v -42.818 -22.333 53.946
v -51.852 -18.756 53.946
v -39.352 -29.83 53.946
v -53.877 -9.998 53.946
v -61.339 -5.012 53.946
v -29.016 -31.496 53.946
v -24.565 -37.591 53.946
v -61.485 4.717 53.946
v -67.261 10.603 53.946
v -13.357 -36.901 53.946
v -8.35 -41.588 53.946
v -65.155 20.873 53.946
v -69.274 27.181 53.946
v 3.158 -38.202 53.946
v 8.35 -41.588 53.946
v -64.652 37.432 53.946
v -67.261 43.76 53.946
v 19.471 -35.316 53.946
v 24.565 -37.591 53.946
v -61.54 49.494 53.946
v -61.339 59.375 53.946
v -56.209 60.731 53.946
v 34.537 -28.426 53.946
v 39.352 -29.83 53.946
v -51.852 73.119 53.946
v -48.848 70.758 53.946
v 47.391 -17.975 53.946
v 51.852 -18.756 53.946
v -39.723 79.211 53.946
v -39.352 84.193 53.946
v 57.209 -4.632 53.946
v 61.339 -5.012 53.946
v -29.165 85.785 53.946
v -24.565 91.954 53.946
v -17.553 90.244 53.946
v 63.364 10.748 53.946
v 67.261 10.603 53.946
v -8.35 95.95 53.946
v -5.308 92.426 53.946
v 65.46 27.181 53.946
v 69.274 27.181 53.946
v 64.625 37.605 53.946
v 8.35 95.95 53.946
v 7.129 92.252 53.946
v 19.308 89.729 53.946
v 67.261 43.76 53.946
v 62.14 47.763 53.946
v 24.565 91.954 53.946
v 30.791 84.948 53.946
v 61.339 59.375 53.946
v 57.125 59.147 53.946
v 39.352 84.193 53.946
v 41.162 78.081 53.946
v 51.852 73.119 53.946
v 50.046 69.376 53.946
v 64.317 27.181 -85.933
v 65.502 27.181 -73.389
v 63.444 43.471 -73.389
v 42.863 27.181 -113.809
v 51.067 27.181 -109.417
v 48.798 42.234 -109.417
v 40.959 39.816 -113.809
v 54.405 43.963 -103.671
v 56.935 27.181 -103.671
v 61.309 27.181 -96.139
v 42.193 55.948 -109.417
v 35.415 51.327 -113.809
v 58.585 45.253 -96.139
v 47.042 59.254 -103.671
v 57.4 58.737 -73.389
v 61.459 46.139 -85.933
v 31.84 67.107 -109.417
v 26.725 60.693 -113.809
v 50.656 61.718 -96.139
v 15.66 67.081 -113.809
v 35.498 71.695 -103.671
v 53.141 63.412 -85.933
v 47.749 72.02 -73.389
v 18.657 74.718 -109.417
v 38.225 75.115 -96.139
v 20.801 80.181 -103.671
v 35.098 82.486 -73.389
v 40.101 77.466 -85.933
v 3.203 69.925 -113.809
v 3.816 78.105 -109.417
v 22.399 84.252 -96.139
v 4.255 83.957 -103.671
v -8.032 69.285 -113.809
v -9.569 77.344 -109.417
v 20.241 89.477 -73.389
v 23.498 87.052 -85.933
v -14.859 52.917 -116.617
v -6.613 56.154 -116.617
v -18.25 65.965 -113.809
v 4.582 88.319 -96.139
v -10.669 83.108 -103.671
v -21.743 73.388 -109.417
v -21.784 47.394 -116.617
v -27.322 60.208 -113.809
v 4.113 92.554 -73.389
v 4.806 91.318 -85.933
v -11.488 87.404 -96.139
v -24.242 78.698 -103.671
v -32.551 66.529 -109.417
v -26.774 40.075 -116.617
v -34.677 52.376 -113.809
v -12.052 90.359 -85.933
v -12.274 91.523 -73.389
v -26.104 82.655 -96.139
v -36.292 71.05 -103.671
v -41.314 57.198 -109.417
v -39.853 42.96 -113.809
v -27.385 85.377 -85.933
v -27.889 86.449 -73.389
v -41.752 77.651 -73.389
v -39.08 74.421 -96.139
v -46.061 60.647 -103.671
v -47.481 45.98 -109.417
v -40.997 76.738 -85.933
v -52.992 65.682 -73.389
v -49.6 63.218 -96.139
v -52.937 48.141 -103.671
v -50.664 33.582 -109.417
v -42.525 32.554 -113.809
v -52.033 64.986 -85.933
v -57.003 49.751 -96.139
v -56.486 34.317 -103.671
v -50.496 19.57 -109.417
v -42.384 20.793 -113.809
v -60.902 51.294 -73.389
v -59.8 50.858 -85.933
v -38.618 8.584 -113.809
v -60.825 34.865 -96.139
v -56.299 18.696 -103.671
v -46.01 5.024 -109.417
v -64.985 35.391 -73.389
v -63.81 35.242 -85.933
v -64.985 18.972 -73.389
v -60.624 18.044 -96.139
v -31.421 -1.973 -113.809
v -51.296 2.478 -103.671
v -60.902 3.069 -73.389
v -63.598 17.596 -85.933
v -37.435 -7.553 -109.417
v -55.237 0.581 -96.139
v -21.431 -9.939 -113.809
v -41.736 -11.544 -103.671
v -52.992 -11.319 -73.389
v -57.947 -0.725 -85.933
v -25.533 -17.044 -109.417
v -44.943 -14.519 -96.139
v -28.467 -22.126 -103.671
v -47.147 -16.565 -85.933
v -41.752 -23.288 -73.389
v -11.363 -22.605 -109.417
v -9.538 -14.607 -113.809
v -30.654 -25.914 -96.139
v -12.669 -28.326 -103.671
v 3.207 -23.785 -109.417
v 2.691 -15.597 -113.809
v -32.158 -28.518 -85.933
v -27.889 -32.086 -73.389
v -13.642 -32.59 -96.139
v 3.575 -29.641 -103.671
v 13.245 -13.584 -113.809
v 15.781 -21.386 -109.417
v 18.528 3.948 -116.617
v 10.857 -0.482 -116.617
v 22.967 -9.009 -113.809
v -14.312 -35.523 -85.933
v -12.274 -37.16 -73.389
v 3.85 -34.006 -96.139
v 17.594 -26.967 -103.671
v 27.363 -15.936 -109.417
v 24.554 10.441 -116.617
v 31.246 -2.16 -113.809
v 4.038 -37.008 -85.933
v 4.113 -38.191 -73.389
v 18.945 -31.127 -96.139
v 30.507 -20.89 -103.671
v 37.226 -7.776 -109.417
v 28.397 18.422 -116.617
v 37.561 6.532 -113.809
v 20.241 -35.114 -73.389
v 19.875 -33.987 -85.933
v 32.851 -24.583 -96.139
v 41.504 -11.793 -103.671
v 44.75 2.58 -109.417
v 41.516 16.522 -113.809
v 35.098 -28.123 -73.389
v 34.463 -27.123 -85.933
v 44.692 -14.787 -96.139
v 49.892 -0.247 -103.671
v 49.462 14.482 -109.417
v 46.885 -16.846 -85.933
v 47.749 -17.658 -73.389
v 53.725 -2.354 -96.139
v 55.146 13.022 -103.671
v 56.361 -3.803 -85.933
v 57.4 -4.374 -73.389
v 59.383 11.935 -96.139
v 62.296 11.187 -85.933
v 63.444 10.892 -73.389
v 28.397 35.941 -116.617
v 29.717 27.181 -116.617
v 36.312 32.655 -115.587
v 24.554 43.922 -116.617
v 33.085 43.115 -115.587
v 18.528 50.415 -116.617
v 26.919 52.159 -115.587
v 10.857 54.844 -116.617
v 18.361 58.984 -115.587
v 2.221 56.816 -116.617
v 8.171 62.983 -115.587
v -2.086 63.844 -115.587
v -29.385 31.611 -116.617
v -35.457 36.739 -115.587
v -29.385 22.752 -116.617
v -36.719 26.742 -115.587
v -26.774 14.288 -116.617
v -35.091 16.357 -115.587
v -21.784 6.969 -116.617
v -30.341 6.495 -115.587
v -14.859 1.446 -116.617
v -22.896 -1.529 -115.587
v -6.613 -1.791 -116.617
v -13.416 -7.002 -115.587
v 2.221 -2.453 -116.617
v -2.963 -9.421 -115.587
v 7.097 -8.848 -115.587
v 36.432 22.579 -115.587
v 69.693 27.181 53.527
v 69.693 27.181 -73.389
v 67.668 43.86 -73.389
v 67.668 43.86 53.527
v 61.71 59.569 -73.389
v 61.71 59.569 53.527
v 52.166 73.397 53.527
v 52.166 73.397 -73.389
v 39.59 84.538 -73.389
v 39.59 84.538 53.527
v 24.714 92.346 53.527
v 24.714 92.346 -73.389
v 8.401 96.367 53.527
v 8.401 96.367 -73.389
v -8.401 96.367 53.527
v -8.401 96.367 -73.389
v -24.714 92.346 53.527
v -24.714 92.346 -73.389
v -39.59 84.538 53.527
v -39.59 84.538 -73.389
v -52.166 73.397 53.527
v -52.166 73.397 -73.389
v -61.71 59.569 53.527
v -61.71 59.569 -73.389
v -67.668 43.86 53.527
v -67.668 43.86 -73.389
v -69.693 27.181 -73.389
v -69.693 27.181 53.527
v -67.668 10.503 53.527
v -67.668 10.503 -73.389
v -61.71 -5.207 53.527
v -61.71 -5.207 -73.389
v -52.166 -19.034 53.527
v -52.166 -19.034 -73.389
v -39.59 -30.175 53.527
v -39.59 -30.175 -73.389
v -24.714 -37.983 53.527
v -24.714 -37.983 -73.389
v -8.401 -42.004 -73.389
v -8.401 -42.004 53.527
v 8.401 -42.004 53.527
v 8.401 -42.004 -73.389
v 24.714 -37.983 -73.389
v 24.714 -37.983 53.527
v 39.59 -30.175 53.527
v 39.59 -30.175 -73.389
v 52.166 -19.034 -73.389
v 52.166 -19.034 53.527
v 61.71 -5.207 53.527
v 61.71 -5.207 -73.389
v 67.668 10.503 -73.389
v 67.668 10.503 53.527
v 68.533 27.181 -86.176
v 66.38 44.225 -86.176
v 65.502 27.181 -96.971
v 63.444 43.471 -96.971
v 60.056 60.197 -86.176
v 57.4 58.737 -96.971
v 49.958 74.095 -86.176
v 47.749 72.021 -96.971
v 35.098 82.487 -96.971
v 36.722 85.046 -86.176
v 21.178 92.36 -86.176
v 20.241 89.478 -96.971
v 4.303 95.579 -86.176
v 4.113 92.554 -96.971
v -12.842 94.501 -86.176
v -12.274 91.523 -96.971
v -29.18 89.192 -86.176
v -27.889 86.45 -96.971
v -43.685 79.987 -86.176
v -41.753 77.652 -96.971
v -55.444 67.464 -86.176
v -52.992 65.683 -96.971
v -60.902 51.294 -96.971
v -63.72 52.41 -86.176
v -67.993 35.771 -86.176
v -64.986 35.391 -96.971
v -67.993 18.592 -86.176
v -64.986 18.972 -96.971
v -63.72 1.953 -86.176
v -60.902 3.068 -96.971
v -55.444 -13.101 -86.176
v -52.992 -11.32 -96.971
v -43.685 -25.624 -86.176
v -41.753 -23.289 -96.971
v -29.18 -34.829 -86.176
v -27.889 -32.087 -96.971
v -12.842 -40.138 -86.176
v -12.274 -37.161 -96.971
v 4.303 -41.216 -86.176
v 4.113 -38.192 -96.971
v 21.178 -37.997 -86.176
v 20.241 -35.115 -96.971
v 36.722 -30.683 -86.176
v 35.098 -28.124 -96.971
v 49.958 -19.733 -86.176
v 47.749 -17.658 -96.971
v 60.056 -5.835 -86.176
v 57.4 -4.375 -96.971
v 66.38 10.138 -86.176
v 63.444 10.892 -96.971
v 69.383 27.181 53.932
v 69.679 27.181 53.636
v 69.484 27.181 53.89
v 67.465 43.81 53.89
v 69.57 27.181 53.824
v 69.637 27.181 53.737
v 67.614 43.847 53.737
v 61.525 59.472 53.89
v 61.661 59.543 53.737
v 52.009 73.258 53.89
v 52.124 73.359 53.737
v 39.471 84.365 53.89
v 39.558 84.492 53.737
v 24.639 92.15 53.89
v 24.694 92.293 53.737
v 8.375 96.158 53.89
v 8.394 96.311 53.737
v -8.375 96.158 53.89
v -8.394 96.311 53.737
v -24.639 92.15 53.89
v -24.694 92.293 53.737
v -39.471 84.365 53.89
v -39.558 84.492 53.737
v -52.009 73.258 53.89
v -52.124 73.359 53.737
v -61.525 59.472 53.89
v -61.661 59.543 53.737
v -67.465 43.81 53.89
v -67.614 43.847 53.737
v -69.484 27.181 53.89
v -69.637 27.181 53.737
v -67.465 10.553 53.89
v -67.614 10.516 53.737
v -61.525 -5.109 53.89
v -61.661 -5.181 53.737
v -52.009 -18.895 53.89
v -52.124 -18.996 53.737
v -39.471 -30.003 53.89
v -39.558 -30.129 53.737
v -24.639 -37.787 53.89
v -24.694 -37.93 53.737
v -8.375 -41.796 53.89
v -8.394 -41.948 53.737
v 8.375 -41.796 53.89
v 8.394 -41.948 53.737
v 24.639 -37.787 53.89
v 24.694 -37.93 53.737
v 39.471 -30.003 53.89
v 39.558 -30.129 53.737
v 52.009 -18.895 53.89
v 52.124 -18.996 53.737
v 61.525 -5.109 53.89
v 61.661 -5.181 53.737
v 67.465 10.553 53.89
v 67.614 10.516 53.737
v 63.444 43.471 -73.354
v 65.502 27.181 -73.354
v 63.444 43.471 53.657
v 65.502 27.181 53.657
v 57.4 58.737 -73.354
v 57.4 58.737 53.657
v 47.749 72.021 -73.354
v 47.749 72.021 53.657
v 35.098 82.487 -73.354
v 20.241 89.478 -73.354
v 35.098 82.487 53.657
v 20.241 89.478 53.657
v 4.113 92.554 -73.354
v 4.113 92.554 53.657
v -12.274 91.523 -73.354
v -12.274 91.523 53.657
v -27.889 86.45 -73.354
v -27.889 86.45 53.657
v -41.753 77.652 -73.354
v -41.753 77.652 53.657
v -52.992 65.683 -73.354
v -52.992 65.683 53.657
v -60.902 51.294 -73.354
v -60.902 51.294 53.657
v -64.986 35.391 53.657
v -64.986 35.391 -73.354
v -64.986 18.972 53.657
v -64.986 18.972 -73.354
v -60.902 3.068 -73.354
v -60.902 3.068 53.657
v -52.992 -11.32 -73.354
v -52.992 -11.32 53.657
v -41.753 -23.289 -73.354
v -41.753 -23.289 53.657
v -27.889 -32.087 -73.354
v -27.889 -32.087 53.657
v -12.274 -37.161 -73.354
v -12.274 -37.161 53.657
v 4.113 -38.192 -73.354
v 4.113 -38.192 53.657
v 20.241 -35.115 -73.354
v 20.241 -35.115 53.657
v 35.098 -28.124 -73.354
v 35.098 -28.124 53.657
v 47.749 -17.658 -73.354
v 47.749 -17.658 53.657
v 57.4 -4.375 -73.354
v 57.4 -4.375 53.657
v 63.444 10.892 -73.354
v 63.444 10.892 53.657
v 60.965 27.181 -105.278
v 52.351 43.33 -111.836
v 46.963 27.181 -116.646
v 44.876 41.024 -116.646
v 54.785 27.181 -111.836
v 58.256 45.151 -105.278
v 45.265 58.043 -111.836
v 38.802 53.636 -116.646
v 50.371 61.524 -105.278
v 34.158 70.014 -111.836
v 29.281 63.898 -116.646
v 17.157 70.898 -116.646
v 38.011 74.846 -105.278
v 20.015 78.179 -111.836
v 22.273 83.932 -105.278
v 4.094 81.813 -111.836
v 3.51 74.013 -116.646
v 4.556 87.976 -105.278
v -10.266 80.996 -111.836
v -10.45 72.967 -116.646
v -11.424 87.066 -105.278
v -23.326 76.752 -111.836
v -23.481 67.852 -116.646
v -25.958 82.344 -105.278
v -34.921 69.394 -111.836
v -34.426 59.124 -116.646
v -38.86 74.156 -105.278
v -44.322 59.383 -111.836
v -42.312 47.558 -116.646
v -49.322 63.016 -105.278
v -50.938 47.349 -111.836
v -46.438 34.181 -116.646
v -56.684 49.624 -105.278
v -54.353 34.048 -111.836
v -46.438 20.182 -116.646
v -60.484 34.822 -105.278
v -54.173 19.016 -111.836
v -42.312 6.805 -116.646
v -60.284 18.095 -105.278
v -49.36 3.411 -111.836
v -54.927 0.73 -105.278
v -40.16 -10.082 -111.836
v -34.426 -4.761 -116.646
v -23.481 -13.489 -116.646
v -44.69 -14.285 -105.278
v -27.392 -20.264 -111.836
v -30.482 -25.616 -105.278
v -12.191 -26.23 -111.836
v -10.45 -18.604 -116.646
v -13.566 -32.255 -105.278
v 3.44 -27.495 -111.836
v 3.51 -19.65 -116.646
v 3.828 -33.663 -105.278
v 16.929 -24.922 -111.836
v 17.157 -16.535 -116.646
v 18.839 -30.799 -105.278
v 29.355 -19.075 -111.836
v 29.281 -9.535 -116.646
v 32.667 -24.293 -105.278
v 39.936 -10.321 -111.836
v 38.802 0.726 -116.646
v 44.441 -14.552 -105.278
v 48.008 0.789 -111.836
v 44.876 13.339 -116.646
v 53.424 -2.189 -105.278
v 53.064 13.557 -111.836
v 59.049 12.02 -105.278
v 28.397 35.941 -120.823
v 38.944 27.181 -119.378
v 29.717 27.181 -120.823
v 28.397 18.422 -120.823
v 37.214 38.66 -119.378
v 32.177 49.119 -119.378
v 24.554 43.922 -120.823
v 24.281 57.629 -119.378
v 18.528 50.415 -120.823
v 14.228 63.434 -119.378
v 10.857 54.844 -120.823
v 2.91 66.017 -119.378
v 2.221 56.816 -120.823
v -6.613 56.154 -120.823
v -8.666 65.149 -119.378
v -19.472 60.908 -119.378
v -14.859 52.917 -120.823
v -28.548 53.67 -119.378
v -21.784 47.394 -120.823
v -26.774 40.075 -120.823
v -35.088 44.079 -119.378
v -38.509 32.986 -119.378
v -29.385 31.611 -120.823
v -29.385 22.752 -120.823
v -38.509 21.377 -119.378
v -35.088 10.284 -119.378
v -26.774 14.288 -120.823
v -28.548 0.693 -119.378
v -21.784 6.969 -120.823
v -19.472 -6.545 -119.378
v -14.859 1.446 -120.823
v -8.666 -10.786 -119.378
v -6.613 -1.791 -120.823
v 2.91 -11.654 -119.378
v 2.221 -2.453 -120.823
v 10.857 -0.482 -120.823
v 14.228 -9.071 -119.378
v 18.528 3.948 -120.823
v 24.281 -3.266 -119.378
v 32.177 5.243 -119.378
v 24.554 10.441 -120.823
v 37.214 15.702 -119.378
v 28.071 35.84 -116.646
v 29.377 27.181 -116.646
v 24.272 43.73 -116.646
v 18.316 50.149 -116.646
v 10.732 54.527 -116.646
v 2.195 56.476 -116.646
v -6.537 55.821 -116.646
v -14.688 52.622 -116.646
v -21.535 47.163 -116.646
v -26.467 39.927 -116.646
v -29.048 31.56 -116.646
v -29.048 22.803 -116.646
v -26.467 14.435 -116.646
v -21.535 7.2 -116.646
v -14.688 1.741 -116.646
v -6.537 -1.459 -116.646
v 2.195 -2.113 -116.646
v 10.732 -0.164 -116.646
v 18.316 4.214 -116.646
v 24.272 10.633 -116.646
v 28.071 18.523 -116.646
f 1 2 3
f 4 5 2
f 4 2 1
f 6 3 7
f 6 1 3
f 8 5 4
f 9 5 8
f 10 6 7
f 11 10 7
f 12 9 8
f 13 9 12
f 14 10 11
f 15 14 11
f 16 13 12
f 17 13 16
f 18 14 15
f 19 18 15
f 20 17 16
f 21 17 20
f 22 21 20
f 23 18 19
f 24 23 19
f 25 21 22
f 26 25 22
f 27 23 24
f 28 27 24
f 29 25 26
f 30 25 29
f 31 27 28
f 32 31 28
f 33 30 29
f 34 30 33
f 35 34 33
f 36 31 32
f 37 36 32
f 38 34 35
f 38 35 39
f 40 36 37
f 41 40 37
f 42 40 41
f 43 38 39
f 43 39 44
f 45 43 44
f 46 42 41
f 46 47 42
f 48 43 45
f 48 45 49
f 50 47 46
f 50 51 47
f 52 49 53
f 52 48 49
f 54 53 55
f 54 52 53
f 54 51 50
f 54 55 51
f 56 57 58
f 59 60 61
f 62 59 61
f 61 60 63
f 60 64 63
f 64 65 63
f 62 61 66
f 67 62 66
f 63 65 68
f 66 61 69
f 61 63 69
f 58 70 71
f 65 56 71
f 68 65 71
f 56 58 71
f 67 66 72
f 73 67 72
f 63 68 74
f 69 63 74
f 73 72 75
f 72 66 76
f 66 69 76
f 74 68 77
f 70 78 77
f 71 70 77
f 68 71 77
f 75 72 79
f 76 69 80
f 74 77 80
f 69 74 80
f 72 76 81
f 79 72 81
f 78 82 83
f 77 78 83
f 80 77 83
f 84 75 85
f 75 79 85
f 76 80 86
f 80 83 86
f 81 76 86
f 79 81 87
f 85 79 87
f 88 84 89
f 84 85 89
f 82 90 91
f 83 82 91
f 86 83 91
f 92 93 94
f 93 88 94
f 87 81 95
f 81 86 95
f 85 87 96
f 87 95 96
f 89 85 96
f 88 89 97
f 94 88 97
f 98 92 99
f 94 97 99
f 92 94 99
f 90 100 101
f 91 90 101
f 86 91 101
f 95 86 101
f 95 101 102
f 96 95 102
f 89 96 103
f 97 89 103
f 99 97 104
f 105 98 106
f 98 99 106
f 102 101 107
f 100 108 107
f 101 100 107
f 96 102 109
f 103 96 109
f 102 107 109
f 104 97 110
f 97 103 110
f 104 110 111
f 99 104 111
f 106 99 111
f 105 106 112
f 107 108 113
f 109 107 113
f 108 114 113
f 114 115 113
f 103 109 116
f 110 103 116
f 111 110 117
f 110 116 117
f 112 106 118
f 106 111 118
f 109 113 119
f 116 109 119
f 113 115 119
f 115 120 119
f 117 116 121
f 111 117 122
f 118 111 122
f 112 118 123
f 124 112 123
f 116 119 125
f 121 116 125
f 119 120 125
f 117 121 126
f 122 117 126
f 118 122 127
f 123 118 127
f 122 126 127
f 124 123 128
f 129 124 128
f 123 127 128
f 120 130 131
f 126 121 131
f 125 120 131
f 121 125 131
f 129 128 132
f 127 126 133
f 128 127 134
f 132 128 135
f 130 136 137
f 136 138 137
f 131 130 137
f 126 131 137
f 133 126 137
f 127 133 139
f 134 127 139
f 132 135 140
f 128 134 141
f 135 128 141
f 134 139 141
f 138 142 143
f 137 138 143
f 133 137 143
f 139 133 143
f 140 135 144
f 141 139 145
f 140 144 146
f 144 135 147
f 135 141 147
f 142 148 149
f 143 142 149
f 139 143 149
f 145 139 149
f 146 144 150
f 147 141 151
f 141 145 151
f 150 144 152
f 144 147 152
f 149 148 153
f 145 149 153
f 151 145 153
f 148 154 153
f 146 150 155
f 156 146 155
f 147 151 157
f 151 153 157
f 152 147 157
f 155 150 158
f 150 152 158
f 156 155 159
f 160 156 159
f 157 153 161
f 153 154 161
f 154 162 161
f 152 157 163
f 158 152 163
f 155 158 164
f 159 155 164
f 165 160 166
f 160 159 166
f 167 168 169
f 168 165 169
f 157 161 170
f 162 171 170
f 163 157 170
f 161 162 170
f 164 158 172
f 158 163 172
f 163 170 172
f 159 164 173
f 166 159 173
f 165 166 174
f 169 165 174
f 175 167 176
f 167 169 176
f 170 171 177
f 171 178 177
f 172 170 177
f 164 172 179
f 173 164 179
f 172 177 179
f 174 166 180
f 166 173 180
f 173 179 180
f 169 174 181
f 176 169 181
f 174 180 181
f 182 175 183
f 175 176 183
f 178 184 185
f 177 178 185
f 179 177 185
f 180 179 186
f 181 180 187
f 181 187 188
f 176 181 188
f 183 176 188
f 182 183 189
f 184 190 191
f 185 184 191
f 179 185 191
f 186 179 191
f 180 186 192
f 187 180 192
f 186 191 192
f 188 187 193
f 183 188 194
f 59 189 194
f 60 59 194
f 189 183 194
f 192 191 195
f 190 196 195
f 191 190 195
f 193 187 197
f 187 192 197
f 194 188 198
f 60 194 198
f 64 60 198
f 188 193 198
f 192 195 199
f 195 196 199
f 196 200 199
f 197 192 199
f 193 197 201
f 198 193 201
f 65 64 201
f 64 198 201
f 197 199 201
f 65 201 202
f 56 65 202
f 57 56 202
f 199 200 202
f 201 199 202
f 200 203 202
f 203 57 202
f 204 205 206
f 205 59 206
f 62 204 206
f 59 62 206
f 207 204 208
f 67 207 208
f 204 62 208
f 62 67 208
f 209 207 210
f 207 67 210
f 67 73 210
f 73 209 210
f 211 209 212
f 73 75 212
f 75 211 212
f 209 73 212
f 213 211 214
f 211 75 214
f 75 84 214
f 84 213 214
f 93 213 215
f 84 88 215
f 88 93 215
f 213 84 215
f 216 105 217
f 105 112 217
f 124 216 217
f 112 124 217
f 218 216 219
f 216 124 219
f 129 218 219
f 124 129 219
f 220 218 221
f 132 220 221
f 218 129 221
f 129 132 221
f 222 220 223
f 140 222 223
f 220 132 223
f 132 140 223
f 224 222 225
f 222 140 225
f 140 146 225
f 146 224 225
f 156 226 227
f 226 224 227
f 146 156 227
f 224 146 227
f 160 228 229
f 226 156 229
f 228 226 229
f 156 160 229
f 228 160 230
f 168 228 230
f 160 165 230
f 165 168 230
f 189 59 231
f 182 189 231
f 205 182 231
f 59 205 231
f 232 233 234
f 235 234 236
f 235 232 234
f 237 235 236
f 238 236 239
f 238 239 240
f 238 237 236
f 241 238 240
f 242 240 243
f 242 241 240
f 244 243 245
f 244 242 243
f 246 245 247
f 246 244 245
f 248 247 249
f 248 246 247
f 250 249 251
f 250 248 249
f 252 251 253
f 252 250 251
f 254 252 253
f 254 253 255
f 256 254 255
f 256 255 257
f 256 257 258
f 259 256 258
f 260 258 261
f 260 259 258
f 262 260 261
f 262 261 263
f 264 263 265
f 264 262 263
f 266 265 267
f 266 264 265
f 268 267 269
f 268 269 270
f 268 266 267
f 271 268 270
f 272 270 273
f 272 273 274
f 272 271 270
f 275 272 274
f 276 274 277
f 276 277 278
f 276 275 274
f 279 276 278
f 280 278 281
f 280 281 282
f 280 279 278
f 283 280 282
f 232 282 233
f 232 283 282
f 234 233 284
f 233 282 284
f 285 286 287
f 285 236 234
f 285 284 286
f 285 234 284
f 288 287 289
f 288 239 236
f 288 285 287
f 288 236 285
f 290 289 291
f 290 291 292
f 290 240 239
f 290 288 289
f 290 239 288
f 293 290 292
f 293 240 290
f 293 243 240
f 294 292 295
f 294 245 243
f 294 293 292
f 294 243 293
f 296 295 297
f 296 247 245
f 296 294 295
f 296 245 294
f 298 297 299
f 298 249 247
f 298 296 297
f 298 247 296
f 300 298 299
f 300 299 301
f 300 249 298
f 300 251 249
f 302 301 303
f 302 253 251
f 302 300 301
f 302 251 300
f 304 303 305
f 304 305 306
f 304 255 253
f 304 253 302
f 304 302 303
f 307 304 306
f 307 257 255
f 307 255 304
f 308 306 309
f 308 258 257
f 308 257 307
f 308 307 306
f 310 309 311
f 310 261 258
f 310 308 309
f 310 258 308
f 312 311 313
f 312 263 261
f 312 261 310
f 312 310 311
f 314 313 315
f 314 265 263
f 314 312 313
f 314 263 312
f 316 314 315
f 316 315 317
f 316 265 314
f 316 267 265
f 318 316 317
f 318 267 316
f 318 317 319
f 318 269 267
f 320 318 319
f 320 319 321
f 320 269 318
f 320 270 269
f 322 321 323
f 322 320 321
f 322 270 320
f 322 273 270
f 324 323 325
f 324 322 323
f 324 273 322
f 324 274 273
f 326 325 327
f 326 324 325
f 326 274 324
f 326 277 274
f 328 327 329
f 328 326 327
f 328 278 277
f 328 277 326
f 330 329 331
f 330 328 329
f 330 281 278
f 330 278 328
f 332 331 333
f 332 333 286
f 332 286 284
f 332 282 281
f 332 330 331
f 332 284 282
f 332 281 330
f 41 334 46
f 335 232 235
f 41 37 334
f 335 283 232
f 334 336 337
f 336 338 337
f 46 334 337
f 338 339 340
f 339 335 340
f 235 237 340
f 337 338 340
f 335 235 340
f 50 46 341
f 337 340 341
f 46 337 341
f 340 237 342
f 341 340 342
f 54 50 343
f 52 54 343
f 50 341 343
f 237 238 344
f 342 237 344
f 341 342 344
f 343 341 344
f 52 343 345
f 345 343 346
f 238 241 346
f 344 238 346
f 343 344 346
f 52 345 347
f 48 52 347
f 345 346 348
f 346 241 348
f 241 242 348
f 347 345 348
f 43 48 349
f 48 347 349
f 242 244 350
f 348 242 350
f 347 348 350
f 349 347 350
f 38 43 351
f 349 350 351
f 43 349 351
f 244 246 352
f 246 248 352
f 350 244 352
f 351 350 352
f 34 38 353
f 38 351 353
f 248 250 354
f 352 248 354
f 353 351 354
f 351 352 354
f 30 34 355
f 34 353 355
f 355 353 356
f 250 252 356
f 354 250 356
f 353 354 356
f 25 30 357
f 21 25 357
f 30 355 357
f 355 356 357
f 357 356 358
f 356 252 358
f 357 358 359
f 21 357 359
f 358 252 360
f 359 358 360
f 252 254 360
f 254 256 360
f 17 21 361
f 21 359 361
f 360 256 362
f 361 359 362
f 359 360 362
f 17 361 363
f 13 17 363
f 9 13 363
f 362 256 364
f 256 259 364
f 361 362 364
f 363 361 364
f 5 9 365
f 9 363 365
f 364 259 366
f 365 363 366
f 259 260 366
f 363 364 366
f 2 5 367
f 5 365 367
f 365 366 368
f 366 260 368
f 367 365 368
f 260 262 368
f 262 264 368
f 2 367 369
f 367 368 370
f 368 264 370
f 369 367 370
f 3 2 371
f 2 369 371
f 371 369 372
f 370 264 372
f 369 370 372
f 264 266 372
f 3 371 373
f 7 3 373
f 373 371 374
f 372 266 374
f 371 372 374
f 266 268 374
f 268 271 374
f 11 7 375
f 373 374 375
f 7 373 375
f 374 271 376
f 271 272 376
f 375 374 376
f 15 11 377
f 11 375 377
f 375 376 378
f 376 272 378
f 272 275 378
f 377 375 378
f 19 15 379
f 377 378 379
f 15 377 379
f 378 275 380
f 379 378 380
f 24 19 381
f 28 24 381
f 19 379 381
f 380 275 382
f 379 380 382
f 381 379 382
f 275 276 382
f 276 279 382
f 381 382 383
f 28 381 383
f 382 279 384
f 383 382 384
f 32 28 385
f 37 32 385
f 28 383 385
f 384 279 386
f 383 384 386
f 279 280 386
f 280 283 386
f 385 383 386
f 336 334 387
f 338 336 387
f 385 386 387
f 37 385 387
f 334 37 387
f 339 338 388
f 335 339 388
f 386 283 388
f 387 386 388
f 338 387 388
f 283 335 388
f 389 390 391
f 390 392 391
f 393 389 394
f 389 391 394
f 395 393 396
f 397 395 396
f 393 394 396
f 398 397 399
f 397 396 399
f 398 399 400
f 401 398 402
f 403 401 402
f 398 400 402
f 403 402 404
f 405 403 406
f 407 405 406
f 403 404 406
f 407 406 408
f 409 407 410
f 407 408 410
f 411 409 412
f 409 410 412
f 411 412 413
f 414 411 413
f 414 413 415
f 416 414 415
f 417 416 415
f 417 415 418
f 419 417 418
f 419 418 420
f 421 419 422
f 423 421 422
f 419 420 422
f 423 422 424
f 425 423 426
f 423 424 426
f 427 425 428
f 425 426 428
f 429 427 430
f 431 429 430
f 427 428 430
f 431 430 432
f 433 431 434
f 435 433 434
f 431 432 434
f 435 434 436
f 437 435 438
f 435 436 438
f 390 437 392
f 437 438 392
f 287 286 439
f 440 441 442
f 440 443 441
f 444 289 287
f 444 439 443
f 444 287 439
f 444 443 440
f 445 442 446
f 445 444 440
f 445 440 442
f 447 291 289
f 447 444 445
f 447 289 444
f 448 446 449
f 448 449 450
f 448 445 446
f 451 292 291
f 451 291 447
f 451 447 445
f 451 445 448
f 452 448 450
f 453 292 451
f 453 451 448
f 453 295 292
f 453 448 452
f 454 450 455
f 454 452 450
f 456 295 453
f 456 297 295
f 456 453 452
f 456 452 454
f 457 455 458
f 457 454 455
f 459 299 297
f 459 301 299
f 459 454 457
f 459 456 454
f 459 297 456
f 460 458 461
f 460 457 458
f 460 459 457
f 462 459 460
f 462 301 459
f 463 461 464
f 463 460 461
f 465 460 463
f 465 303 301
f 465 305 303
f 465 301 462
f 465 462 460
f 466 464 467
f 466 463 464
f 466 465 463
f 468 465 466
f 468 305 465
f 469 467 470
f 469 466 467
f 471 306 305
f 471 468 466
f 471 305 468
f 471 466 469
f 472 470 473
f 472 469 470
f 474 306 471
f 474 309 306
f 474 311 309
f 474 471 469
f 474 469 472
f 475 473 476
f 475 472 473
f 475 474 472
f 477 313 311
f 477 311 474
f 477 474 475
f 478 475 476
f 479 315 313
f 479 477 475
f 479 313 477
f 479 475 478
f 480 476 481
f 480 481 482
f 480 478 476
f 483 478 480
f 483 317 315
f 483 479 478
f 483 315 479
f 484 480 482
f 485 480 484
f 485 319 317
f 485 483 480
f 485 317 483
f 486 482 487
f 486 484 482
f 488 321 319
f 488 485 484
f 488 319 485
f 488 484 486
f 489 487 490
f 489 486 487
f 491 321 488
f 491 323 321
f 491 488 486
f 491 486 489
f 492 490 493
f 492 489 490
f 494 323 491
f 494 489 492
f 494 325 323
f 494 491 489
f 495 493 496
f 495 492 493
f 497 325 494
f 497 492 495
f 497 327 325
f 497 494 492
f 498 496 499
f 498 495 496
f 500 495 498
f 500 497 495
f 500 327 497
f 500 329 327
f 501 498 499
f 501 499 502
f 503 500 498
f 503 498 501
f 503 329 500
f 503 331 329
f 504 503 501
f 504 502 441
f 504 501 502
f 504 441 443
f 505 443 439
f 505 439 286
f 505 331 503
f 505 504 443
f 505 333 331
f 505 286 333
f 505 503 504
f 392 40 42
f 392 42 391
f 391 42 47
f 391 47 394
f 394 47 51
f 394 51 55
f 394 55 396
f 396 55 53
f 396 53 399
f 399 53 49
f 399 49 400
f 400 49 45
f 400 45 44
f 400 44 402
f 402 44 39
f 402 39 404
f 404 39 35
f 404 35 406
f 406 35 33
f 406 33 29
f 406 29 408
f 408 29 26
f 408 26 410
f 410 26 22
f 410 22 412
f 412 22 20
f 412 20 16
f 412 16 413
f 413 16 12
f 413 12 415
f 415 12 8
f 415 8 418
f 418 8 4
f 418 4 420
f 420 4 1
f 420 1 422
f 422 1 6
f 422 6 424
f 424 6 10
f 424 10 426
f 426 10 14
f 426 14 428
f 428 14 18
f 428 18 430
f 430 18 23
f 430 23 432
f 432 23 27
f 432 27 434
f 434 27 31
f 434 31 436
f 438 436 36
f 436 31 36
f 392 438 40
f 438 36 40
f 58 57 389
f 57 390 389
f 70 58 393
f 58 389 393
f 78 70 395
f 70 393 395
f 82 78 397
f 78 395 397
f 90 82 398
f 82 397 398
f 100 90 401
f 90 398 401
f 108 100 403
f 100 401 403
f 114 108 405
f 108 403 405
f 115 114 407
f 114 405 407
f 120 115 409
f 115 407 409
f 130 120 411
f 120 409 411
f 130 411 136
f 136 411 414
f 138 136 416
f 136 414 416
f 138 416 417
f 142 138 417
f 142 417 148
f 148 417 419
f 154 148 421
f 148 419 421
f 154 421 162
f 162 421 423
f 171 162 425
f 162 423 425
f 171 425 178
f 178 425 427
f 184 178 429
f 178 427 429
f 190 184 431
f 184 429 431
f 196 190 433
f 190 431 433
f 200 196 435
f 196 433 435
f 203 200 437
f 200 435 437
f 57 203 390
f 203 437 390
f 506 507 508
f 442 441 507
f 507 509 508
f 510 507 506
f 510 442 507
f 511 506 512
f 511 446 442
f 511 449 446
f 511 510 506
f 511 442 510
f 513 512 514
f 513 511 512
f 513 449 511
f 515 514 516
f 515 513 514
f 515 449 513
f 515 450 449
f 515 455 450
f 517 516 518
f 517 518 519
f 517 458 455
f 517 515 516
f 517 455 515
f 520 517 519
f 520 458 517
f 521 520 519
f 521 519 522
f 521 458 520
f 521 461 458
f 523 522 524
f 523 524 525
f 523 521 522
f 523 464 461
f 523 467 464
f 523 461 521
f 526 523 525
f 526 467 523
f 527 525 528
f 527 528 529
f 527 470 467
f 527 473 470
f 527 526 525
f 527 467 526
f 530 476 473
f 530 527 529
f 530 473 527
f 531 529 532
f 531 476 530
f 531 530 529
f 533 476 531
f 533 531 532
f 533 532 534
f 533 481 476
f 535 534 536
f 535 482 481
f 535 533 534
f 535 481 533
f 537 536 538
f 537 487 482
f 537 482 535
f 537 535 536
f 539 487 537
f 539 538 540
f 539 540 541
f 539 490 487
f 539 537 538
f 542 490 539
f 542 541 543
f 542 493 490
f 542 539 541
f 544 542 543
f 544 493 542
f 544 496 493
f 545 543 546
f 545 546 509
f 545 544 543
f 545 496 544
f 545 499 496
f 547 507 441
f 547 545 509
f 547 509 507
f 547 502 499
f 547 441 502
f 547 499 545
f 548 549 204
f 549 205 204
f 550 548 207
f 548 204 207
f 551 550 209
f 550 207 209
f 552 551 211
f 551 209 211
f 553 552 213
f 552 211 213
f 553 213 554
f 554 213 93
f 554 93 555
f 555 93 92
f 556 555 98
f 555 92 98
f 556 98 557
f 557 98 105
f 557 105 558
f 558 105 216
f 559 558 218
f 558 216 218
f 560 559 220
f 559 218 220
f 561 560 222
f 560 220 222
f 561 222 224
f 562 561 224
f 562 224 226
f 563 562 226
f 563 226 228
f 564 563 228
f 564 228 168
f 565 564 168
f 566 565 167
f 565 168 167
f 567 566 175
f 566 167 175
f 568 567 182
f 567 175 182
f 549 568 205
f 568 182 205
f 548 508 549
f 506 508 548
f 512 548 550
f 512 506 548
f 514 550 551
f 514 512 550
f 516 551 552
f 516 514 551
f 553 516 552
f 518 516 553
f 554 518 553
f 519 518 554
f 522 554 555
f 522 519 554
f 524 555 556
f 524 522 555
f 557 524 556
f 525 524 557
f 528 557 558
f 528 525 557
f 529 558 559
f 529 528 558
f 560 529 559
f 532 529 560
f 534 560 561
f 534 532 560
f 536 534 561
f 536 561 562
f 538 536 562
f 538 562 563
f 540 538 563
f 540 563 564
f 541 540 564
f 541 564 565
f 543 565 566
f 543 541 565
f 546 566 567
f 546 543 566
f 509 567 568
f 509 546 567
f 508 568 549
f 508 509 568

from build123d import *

# Parameters (mm, degrees)
REVOLVE_THIN3_OUTLINE_W   = 2.54
REVOLVE_THIN3_OUTLINE_H   = 76.976451611
REVOLVE_THIN3_OUTLINE_H_2 = 0.206366599
REVOLVE_THIN3_OUTLINE_H_3 = 0.02094686
SKETCH32_R                = 47.246273806
SKETCH32_R_2              = 1.041920848
BOSS_EXTRUDE1_DEPTH       = 2.54
FILLET1_R                 = 2.54
SKETCH33_W                = 85.158841119
SKETCH33_H                = 0.170915888
CUT_EXTRUDE1_DEPTH        = 108.458
FILLET2_R                 = 0.254
FILLET3_R                 = 0.254
SCALE3_SCALE              = 1.65
SKETCH35_W                = 53.780187303
SKETCH35_H                = 190.112658653
CUT_EXTRUDE2_DEPTH        = 201.422


# Read off the part's stored shape, not the designer's step: Revolve-Thin3
with BuildPart() as part:
    # Revolve-Thin3 outline → Revolve-Thin3 (revolve)
    with BuildSketch(Plane.XZ.offset(-16.473592108)):
        with Locations((40.968314643, -5.968874658)):
            Rectangle(REVOLVE_THIN3_OUTLINE_W, REVOLVE_THIN3_OUTLINE_H)
        with BuildLine():
            add(Edge.make_bspline(
                [(39.698314643, 32.519351147), (39.687726817, 32.588202211), (39.677799336, 32.656993484), (39.668523832, 32.725717746)],
                knots=[0, 0, 0, 0, 0.007277117, 0.007277117, 0.007277117, 0.007277117], degree=3))
            Line((39.698314643, 32.519351147), (39.698314643, 32.725717746))
            Line((39.698314643, 32.725717746), (39.668523832, 32.725717746))
        make_face()
        with Locations((40.968314643, 32.622534446)):
            Rectangle(REVOLVE_THIN3_OUTLINE_W, REVOLVE_THIN3_OUTLINE_H_2)
        with BuildLine():
            add(Edge.make_bspline(
                [(39.668523832, 32.725717746), (39.518472779, 33.837479263), (39.539043978, 34.931703978), (39.695973098, 35.985611225), (39.697140195, 35.99339708), (39.698314643, 36.001180261)],
                knots=[0.007277117, 0.007277117, 0.007277117, 0.007277117, 0.125, 0.125, 0.125876466, 0.125876466, 0.125876466, 0.125876466], degree=3))
            Line((39.668523832, 32.725717746), (39.698314643, 32.725717746))
            Line((39.698314643, 32.725717746), (39.698314643, 36.001180261))
        make_face()
        with BuildLine():
            Line((39.698314643, -44.478047324), (39.698314643, -44.457100464))
            add(Edge.make_bspline(
                [(39.697961573, -44.478047324), (39.698080508, -44.471066539), (39.698198198, -44.464084253), (39.698314643, -44.457100464)],
                knots=[0.999591782, 0.999591782, 0.999591782, 0.999591782, 1, 1, 1, 1], degree=3))
            Line((39.697961573, -44.478047324), (39.698314643, -44.478047324))
        make_face()
        with Locations((40.968314643, -44.467573894)):
            Rectangle(REVOLVE_THIN3_OUTLINE_W, REVOLVE_THIN3_OUTLINE_H_3)
        with BuildLine():
            Line((39.698314643, 36.001180261), (39.698314643, 32.725717746))
            Line((39.698314643, 32.725717746), (42.238314643, 32.725717746))
            add(Edge.make_bspline(
                [(42.238314643, 32.725717746), (42.054562539, 33.777592883), (42.068967464, 34.803136992), (42.238314643, 35.799403945)],
                knots=[0, 0, 0, 0, 0.141281123, 0.141281123, 0.141281123, 0.141281123], degree=3))
            Line((42.238314643, 35.799403945), (42.238314643, 42.203297665))
            add(Edge.make_bspline(
                [(39.698314643, 36.001180261), (39.864637797, 37.10341997), (40.178381679, 38.152034474), (41.000947274, 40.135916369), (41.510862605, 41.071843995), (42.130351801, 42.038577334), (42.184085036, 42.121152876), (42.238314643, 42.203297665)],
                knots=[0.125876466, 0.125876466, 0.125876466, 0.125876466, 0.25, 0.25, 0.375, 0.375, 0.386733849, 0.386733849, 0.386733849, 0.386733849], degree=3))
        make_face()
        with BuildLine():
            Line((39.698314643, -44.478047324), (39.697961573, -44.478047324))
            add(Edge.make_bspline(
                [(18.010435206, -70.677083721), (19.79573085, -70.522158772), (21.456515081, -70.25595625), (24.590707244, -69.498066317), (26.054293619, -68.998406284), (28.729976787, -67.78317439), (29.942341958, -67.068017905), (32.141805888, -65.420707287), (33.129574164, -64.488411909), (34.902639951, -62.386085615), (35.688102783, -61.215394241), (37.05999238, -58.60954034), (37.646016791, -57.174096931), (39.087083849, -52.452836699), (39.625242566, -48.746219412), (39.697961573, -44.478047324)],
                knots=[0.004627238, 0.004627238, 0.004627238, 0.004627238, 0.125, 0.125, 0.25, 0.25, 0.375, 0.375, 0.5, 0.5, 0.625, 0.625, 0.75, 0.75, 0.999591782, 0.999591782, 0.999591782, 0.999591782], degree=3))
            Line((18.010435206, -70.677083721), (18.010435206, -70.694456457))
            Line((18.010435206, -70.694456457), (28.462249201, -70.694456457))
            add(Edge.make_bspline(
                [(28.462249201, -70.694456457), (36.319875776, -67.117155429), (39.698314643, -58.770046926)],
                knots=[0.250450742, 0.250450742, 0.250450742, 0.688405646, 0.688405646, 0.688405646], degree=2))
            Line((39.698314643, -58.770046926), (39.698314643, -44.478047324))
        make_face()
        with BuildLine():
            Line((42.238314643, -44.478047324), (39.698314643, -44.478047324))
            Line((39.698314643, -44.478047324), (39.698314643, -58.770046926))
            add(Edge.make_bspline(
                [(39.698314643, -58.770046926), (42.101992439, -52.831280485), (42.238314643, -44.478047324)],
                knots=[0.688405646, 0.688405646, 0.688405646, 1, 1, 1], degree=2))
        make_face()
        with BuildLine():
            add(Edge.make_bspline(
                [(42.238314643, 42.203297665), (42.472937439, 42.558694673), (42.716851503, 42.906028704), (43.268191066, 43.654706519), (43.576088068, 44.050007388), (44.486136773, 45.194626874), (45.074219946, 45.904218472), (46.0952688, 47.247624232), (46.526137449, 47.880446647), (46.995778794, 48.764796386), (47.123505223, 49.048386117), (47.278542653, 49.476995244), (47.325447008, 49.628350247), (47.363757964, 49.77823029)],
                knots=[0.386733849, 0.386733849, 0.386733849, 0.386733849, 0.4375, 0.4375, 0.5, 0.5, 0.625, 0.625, 0.75, 0.75, 0.8125, 0.8125, 0.847702352, 0.847702352, 0.847702352, 0.847702352], degree=3))
            Line((42.238314643, 42.203297665), (42.238314643, 35.799403945))
            add(Edge.make_bspline(
                [(42.238314643, 35.799403945), (42.577155463, 37.792799485), (44.167905472, 40.904465888), (46.512712316, 43.628815223), (47.363757964, 44.722836867)],
                knots=[0.141281123, 0.141281123, 0.141281123, 0.141281123, 0.423965559, 0.610115154, 0.610115154, 0.610115154, 0.610115154], degree=3))
            Line((47.363757964, 44.722836867), (47.363757964, 49.77823029))
        make_face()
        with BuildLine():
            Line((18.010435206, -70.694456457), (18.010435206, -70.677083721))
            add(Edge.make_bspline(
                [(17.803998036, -70.694456457), (17.872994465, -70.688830195), (17.941806831, -70.683039176), (18.010435206, -70.677083721)],
                knots=[0, 0, 0, 0, 0.004627238, 0.004627238, 0.004627238, 0.004627238], degree=3))
            Line((17.803998036, -70.694456457), (18.010435206, -70.694456457))
        make_face()
        with BuildLine():
            add(Edge.make_bspline(
                [(47.363757964, 49.77823029), (47.393466178, 49.894454702), (47.418006992, 50.009792187), (47.482293388, 50.388738185), (47.501353806, 50.652055315), (47.481910982, 51.210629928), (47.44332582, 51.506604575), (47.363757964, 51.83451188)],
                knots=[0.847702352, 0.847702352, 0.847702352, 0.847702352, 0.875, 0.875, 0.9375, 0.9375, 1, 1, 1, 1], degree=3))
            Line((47.363757964, 49.77823029), (47.363757964, 44.722836867))
            add(Edge.make_bspline(
                [(47.363757964, 44.722836867), (48.462338755, 46.135065654), (49.427688757, 47.567830661), (49.832127601, 49.178979157)],
                knots=[0.610115154, 0.610115154, 0.610115154, 0.610115154, 0.850408223, 0.850408223, 0.850408223, 0.850408223], degree=3))
            Line((49.832127601, 49.178979157), (49.832127601, 51.83451188))
            Line((49.832127601, 51.83451188), (47.363757964, 51.83451188))
        make_face()
        Polygon((18.010435206, -70.694456457), (17.803998036, -70.694456457), (18.010435206, -73.226053521), align=None)
        with BuildLine():
            Line((28.462249201, -70.694456457), (18.010435206, -70.694456457))
            Line((18.010435206, -70.694456457), (18.010435206, -73.226053521))
            add(Edge.make_bspline(
                [(18.010435206, -73.226053521), (23.968753656, -72.740186943), (28.462249201, -70.694456457)],
                knots=[0, 0, 0, 0.250450742, 0.250450742, 0.250450742], degree=2))
        make_face()
        Polygon((49.832127601, 52.433470423), (47.363757964, 51.83451188), (49.832127601, 51.83451188), align=None)
        with BuildLine():
            Line((49.832127601, 51.83451188), (49.832127601, 49.178979157))
            add(Edge.make_bspline(
                [(49.832127601, 49.178979157), (49.962029278, 49.696463804), (50.0340657, 50.232351019), (50.034065718, 50.791871057)],
                knots=[0.850408223, 0.850408223, 0.850408223, 0.850408223, 0.927587932, 0.927587932, 0.927587932, 0.927587932], degree=3))
            add(Edge.make_bspline(
                [(50.034065718, 50.791871057), (50.034065729, 51.130381669), (50.007698462, 51.477542535), (49.951825757, 51.83451188)],
                knots=[0.927587932, 0.927587932, 0.927587932, 0.927587932, 0.974281793, 0.974281793, 0.974281793, 0.974281793], degree=3))
            Line((49.951825757, 51.83451188), (49.832127601, 51.83451188))
        make_face()
        with BuildLine():
            add(Edge.make_bspline(
                [(49.951825757, 51.83451188), (49.921051995, 52.031124695), (49.881327391, 52.230713035), (49.832127601, 52.433470423)],
                knots=[0.974281793, 0.974281793, 0.974281793, 0.974281793, 1, 1, 1, 1], degree=3))
            Line((49.832127601, 52.433470423), (49.832127601, 51.83451188))
            Line((49.832127601, 51.83451188), (49.951825757, 51.83451188))
        make_face()
    revolve(axis=Axis((0, 16.473592108, 0), (0, 0, 1)))

    # Sketch33 → Cut-Extrude1 (cut)
    with BuildSketch(Plane(origin=(0, 76.2, 0), x_dir=(1, 0, 0), z_dir=(0, 1, 0))):
        with Locations((-0.060456445, -32.78023641)):
            Rectangle(SKETCH33_W, SKETCH33_H)
    extrude(amount=-CUT_EXTRUDE1_DEPTH, mode=Mode.SUBTRACT)


with BuildPart() as body_2:
    # Sketch32 → Boss-Extrude1 (new body)
    with BuildSketch(Plane.XY.offset(52.433470423)):
        with Locations((0, 16.473592108)):
            Circle(SKETCH32_R)
        with Locations((0, 16.473592108)):
            Circle(SKETCH32_R_2, mode=Mode.SUBTRACT)
    extrude(amount=BOSS_EXTRUDE1_DEPTH)

    # Fillet1
    fillet1_edges = [body_2.edges().sort_by_distance(p)[0] for p in [
        (-47.246273806, 16.473592108, 54.973470423),
        (-1.041920848, 16.473592108, 54.973470423),
    ]]
    fillet(fillet1_edges, radius=FILLET1_R - 0.0001)  # a hair under: the kernel refuses the full size


with BuildPart() as cut_extrude1_piece_1:
    # of the separate pieces the step leaves, piece 1, a body of its own (cut_extrude1_pieces)
    add(part.part.solids().sort_by_distance((42.238314643, 16.473592108, 32.694778466))[0])

    # Fillet2
    fillet2_edges = [cut_extrude1_piece_1.edges().sort_by_distance(p)[0] for p in [
        (-42.238314643, 16.473592108, 32.694778466),
    ]]
    fillet(fillet2_edges, radius=FILLET2_R)


with BuildPart() as cut_extrude1_piece_2:
    # of the separate pieces the step leaves, piece 2, a body of its own (cut_extrude1_pieces)
    add(part.part.solids().sort_by_distance((42.215003382, 16.473592108, 32.865694354))[0])

    # Fillet3
    fillet3_edges = [cut_extrude1_piece_2.edges().sort_by_distance(p)[0] for p in [
        (-42.21500338, 16.473592107, 32.865694354),
    ]]
    fillet(fillet3_edges, radius=FILLET3_R)


with BuildPart() as body_2_1:
    # Scale3: scaled about (0, 0, 0)
    add(body_2.part.scale(SCALE3_SCALE))


with BuildPart() as cut_extrude1_piece_1_1:
    # Scale3: scaled about (0, 0, 0)
    add(cut_extrude1_piece_1.part.scale(SCALE3_SCALE))


with BuildPart() as cut_extrude1_piece_2_1:
    # Scale3: scaled about (0, 0, 0)
    add(cut_extrude1_piece_2.part.scale(SCALE3_SCALE))


with BuildPart() as cut_extrude2_tool:
    # Sketch35 → Cut-Extrude2 (new body)
    with BuildSketch(Plane(origin=(-101.6, 0, 0), x_dir=(0, 0, -1), z_dir=(1, 0, 0))):
        with Locations((-80.974469867, 30.532269515)):
            Rectangle(SKETCH35_W, SKETCH35_H)
    extrude(amount=CUT_EXTRUDE2_DEPTH)


with BuildPart() as body_2_2:
    add(body_2_1.part)

    # Cut-Extrude2: cut by cut_extrude2_tool
    add(cut_extrude2_tool.part, mode=Mode.SUBTRACT)


with BuildPart() as cut_extrude1_piece_2_2:
    add(cut_extrude1_piece_2_1.part)

    # Cut-Extrude2: cut by cut_extrude2_tool
    add(cut_extrude2_tool.part, mode=Mode.SUBTRACT)


solid = cut_extrude1_piece_1_1.part
